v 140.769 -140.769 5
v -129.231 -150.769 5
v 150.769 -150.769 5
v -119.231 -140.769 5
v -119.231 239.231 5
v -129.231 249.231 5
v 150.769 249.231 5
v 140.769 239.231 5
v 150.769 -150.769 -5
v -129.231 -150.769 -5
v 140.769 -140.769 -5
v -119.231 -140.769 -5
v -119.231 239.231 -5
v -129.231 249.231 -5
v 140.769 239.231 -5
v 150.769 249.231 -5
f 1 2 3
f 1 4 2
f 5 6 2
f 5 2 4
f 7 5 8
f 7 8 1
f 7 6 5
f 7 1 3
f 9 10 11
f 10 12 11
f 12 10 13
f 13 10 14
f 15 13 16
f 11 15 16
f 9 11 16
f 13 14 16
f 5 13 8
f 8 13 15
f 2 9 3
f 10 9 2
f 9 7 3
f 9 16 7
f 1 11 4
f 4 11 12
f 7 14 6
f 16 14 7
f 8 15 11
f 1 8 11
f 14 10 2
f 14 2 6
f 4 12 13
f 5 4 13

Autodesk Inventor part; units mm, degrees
ref_plane "YZ Plane" through (0, 0, 0) normal (1, 0, 0) x (0, 1, 0)
ref_plane "XZ Plane" through (0, 0, 0) normal (0, 1, 0) x (-1, 0, 0)
ref_plane "XY Plane" through (0, 0, 0) normal (0, 0, 1) x (1, 0, 0)
sketch "Sketch1" plane through (0, 0, 0) normal (0, 0, 1) x (1, 0, 0)
  line L0 (-129.2308, 249.2308) -> (150.7692, 249.2308)
  line L1 (150.7692, 249.2308) -> (150.7692, -150.7692)
  line L2 (150.7692, -150.7692) -> (-129.2308, -150.7692)
  line L3 (-129.2308, -150.7692) -> (-129.2308, 249.2308)
  line L4 (-119.2308, 239.2308) -> (140.7692, 239.2308)
  line L5 (140.7692, 239.2308) -> (140.7692, -140.7692)
  line L6 (140.7692, -140.7692) -> (-119.2308, -140.7692)
  line L7 (-119.2308, -140.7692) -> (-119.2308, 239.2308)
  point P0 (0, 0)
  dimension "d0" = 280
  dimension "d1" = 400
  dimension "d2" = 10
  dimension "d3" = 10
  dimension "d4" = 10
  dimension "d5" = 10
  dimension "d6" = 150.7692
  dimension "d7" = 249.2308
extrude "Extrusion1" add sketch "Sketch1" along normal mid plane 10
properties part number "Steel support 5" material "Steel"
